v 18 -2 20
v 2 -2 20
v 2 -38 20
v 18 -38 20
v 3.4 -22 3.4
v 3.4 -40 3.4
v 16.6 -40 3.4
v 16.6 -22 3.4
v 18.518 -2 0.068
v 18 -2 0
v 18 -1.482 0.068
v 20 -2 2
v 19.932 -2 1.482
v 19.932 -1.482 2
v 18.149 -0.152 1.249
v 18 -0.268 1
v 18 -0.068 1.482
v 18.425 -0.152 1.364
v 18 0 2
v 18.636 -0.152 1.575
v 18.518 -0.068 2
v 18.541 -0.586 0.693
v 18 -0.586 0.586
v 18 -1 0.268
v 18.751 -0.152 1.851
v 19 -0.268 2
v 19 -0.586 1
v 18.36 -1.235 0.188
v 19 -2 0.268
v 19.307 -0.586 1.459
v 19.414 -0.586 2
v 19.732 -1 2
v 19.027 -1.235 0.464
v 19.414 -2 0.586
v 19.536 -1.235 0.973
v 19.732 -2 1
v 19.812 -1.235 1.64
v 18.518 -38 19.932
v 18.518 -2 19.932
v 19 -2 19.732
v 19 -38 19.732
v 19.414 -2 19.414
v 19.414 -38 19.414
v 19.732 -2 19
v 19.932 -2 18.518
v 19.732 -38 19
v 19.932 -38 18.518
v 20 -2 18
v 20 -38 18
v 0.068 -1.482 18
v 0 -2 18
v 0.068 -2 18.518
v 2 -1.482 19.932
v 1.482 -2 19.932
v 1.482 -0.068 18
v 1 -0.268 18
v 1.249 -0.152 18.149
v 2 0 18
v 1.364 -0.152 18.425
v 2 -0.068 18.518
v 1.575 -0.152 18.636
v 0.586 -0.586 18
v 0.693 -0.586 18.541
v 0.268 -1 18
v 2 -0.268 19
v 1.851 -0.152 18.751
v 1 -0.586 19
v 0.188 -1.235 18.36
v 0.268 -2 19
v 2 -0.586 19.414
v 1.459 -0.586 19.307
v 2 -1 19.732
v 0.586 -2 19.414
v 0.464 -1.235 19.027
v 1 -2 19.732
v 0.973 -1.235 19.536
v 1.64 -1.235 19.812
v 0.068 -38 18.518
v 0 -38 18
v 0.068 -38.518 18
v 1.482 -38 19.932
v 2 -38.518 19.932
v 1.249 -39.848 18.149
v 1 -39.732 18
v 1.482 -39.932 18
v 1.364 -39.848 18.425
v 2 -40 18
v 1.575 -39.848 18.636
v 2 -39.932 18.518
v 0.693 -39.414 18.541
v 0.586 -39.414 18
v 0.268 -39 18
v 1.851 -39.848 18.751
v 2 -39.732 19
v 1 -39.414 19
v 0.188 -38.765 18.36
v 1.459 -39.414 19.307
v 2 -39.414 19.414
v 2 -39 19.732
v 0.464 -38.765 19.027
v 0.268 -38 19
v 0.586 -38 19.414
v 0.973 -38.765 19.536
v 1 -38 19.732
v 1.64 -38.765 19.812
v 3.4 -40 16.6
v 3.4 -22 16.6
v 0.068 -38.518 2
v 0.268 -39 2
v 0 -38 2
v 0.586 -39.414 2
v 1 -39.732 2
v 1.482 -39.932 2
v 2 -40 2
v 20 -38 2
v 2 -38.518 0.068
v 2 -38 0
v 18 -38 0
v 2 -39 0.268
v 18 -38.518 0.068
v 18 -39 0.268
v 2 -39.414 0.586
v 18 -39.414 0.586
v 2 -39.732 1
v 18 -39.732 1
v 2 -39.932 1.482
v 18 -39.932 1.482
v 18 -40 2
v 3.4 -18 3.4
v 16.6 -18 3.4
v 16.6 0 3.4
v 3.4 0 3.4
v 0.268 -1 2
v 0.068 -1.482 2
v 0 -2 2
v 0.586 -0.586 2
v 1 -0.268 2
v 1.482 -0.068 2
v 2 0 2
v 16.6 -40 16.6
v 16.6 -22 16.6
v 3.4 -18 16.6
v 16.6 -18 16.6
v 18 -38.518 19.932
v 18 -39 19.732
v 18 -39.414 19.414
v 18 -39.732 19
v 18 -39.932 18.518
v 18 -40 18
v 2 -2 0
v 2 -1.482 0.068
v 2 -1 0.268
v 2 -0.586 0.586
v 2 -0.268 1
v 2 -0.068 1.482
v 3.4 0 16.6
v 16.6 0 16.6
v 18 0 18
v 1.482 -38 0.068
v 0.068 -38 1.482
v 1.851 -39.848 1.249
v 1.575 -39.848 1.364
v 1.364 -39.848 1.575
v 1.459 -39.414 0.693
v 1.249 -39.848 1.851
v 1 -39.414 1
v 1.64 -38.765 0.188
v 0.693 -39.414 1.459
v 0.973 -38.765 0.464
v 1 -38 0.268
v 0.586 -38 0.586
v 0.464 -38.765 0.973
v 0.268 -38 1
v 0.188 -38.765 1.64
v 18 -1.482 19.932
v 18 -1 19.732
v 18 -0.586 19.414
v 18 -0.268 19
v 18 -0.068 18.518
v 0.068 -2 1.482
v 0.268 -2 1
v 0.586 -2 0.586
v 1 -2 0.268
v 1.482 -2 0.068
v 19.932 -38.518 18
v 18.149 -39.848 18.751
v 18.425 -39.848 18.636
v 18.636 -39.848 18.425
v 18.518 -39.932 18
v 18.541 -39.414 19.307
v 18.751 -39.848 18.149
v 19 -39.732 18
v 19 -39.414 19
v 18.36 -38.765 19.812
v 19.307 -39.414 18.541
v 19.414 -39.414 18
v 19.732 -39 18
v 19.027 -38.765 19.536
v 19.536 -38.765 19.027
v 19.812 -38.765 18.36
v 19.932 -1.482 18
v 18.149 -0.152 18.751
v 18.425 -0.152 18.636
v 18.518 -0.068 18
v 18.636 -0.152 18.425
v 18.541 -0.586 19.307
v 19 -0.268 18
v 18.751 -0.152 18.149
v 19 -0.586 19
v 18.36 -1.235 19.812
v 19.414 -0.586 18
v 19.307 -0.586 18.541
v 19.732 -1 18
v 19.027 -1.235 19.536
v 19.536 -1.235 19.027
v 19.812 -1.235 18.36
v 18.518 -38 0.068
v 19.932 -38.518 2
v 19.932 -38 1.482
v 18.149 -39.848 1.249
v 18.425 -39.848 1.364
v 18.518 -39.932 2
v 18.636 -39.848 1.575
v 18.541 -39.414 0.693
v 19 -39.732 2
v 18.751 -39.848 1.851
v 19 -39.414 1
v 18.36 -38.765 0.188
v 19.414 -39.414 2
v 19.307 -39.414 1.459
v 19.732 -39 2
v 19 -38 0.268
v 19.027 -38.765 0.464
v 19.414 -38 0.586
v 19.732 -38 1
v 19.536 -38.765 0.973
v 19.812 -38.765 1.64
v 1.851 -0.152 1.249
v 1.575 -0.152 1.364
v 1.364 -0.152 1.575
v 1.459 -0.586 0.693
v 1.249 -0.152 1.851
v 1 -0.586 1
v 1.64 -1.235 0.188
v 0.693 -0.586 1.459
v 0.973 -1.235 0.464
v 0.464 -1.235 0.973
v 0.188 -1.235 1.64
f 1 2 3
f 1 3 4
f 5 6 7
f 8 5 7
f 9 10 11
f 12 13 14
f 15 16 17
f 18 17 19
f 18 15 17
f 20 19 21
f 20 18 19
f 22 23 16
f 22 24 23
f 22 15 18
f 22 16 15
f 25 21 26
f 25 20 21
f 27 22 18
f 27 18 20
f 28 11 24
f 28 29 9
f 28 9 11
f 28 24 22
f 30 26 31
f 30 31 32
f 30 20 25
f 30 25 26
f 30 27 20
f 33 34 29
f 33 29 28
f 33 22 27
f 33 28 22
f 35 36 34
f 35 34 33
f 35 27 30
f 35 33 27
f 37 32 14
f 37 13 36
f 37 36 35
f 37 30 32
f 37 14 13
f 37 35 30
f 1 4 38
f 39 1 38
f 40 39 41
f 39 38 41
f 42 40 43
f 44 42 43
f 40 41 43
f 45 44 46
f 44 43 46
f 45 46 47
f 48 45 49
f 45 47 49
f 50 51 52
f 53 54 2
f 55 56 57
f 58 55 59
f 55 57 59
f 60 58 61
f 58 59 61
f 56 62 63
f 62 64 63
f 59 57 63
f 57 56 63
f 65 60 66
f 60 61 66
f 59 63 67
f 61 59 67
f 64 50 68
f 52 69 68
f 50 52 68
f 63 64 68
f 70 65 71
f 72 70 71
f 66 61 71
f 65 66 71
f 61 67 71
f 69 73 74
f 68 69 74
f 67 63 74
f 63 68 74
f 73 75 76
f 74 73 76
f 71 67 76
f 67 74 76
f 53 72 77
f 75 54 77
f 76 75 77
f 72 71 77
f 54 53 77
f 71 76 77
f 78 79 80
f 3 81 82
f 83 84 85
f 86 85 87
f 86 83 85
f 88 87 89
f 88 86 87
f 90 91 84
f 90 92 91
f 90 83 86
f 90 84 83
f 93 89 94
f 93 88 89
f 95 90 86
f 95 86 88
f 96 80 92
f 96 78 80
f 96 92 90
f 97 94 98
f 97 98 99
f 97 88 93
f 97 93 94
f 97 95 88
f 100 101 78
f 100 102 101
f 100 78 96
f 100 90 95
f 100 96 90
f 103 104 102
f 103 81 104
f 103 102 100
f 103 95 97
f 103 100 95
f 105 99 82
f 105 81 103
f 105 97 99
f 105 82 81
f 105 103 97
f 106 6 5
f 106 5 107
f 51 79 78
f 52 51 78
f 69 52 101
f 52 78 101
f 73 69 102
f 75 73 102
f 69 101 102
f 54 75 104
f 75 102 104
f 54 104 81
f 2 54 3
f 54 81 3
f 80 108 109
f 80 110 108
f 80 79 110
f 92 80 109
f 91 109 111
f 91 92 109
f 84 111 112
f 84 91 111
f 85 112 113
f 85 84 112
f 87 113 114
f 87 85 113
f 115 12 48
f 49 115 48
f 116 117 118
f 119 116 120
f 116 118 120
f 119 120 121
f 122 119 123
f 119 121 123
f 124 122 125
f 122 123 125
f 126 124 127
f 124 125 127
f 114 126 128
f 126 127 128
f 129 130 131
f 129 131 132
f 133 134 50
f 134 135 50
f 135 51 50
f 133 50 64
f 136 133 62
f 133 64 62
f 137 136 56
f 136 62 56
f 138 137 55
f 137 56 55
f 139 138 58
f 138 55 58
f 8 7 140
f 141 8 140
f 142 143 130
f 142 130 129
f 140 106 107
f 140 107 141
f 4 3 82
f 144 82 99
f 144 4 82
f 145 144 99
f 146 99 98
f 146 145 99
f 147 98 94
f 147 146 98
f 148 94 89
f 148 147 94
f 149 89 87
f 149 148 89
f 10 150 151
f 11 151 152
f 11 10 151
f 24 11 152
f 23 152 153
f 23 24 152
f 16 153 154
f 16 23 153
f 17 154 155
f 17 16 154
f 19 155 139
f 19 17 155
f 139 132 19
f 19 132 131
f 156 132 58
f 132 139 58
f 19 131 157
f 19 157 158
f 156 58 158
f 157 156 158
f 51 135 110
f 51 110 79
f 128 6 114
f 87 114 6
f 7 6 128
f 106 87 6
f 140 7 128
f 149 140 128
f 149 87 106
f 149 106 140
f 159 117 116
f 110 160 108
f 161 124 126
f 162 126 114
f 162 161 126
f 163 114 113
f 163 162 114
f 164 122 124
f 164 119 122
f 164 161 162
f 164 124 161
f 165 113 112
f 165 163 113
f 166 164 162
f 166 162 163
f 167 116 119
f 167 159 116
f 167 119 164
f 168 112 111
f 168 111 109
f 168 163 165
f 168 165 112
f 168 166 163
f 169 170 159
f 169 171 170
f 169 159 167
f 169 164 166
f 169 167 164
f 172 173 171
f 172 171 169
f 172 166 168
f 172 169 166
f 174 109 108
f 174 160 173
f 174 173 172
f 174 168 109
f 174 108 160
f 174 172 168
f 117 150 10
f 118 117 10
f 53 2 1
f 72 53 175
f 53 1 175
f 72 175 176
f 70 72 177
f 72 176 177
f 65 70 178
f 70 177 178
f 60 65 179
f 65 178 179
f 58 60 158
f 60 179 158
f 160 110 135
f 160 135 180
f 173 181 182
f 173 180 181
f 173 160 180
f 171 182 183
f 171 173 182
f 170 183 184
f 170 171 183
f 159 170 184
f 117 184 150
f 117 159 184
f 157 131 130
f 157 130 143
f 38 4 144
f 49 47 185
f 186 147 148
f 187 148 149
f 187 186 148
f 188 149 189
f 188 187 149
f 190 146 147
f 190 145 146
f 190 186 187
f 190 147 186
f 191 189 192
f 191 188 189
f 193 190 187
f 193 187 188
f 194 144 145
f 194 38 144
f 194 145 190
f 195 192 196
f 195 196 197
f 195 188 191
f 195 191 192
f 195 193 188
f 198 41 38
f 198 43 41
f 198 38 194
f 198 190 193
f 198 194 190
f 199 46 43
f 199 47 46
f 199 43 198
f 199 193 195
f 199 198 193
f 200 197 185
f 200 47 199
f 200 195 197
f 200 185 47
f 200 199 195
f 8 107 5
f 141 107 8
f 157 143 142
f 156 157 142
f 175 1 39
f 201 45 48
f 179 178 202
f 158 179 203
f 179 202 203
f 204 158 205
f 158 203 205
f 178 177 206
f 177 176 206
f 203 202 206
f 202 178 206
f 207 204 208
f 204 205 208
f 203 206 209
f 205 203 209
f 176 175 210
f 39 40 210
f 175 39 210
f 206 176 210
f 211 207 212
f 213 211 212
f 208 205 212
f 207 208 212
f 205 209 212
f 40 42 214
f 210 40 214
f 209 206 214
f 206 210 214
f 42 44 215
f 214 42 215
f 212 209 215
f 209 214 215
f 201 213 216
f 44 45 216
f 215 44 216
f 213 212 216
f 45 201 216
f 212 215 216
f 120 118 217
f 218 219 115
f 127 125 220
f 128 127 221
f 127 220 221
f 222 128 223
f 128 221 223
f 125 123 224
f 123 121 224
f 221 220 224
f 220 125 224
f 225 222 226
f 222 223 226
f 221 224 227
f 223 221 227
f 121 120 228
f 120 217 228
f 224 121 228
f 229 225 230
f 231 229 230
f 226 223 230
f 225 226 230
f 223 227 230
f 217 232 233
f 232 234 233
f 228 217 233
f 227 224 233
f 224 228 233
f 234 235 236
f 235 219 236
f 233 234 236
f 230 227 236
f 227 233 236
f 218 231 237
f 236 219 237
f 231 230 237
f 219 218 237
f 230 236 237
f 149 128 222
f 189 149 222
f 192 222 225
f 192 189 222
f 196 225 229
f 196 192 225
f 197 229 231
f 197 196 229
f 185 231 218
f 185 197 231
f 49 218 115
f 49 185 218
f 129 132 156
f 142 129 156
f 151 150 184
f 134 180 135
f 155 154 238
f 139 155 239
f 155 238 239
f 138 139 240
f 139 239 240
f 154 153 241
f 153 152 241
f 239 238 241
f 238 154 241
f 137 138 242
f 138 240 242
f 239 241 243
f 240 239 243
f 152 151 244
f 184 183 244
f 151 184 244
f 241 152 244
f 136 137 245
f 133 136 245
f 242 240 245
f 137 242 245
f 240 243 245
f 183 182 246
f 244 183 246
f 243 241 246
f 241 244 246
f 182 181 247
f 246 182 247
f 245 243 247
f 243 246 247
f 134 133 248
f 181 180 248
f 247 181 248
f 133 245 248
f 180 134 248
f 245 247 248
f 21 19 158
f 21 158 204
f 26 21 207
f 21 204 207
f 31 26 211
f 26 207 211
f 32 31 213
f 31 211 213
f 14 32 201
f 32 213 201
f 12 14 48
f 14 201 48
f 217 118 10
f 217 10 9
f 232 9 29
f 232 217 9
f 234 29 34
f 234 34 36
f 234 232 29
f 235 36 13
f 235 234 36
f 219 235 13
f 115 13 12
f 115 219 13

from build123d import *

# Parameters (mm, degrees)
F0_W     = 20
F0_H     = 20
F1_DEPTH = 40
F2_W     = 13.2
F2_H     = 13.2
F3_DEPTH = 18
F4_W     = 13.2
F4_H     = 13.2
F5_DEPTH = 18
F6_R     = 2


with BuildPart() as f1:
    # F0 (on Front) → F1 (new body)
    with BuildSketch(Plane.XZ):
        with Locations((10, 10)):
            Rectangle(F0_W, F0_H)
    extrude(amount=F1_DEPTH)

    # F2 (on face) → F3 (cut)
    with BuildSketch(Plane(origin=(0, 0, 0), x_dir=(-1, 0, 0), z_dir=(0, 1, 0))):
        with Locations((-10, 10)):
            Rectangle(F2_W, F2_H)
    extrude(amount=-F3_DEPTH, mode=Mode.SUBTRACT)

    # F4 (on face) → F5 (cut)
    with BuildSketch(Plane.XZ.offset(40)):
        with Locations((10, 10)):
            Rectangle(F4_W, F4_H)
    extrude(amount=-F5_DEPTH, mode=Mode.SUBTRACT)

    # F6
    f6_edges = [f1.edges().sort_by_distance(p)[0] for p in [
        (0, -20, 0),
        (20, -20, 0),
        (10, 0, 0),
        (10, -40, 0),
        (0, -20, 20),
        (0, 0, 10),
        (0, -40, 10),
        (20, -20, 20),
        (10, 0, 20),
        (10, -40, 20),
        (20, 0, 10),
        (20, -40, 10),
    ]]
    fillet(f6_edges, radius=F6_R)


solid = f1.part
